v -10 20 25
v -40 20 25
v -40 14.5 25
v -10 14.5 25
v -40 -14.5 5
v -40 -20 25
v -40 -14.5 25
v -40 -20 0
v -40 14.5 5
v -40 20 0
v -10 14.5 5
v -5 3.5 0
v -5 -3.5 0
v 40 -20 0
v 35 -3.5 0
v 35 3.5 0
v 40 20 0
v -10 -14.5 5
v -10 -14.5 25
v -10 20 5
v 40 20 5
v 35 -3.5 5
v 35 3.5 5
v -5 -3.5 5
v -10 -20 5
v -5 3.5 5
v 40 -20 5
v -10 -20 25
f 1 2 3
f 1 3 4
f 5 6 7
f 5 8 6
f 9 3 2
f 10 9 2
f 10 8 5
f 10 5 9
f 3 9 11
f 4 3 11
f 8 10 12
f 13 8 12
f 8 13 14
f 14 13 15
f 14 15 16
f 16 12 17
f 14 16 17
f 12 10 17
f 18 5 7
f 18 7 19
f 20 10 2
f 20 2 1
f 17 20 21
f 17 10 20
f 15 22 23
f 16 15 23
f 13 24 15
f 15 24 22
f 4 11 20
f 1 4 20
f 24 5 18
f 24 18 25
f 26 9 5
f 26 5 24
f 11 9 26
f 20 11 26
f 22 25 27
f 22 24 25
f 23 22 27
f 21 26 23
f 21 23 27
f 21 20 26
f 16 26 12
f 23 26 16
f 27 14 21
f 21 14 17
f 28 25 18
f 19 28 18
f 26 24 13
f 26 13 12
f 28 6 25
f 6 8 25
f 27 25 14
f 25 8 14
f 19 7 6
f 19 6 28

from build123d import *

# Parameters (mm, degrees)
F0_W     = 80
F0_H     = 40
F1_DEPTH = 5
F2_W     = 30
F2_H     = 5.5
F3_DEPTH = 20
F4_W     = 40
F4_H     = 7
F5_DEPTH = 22.4


with BuildPart() as f1:
    # F0 (on Top) → F1 (new body)
    with BuildSketch(Plane.XY):
        Rectangle(F0_W, F0_H)
    extrude(amount=F1_DEPTH)

    # F2 (on face) → F3 (join)
    with BuildSketch(Plane.XY.offset(5)):
        with Locations((-25, -17.25)):
            Rectangle(F2_W, F2_H)
        with Locations((-25, 17.25)):
            Rectangle(F2_W, F2_H)
    extrude(amount=F3_DEPTH)

    # F4 (on face) → F5 (cut)
    with BuildSketch(Plane.XY.offset(5)):
        with Locations((15, 0)):
            Rectangle(F4_W, F4_H)
    extrude(amount=-F5_DEPTH, mode=Mode.SUBTRACT)


solid = f1.part
